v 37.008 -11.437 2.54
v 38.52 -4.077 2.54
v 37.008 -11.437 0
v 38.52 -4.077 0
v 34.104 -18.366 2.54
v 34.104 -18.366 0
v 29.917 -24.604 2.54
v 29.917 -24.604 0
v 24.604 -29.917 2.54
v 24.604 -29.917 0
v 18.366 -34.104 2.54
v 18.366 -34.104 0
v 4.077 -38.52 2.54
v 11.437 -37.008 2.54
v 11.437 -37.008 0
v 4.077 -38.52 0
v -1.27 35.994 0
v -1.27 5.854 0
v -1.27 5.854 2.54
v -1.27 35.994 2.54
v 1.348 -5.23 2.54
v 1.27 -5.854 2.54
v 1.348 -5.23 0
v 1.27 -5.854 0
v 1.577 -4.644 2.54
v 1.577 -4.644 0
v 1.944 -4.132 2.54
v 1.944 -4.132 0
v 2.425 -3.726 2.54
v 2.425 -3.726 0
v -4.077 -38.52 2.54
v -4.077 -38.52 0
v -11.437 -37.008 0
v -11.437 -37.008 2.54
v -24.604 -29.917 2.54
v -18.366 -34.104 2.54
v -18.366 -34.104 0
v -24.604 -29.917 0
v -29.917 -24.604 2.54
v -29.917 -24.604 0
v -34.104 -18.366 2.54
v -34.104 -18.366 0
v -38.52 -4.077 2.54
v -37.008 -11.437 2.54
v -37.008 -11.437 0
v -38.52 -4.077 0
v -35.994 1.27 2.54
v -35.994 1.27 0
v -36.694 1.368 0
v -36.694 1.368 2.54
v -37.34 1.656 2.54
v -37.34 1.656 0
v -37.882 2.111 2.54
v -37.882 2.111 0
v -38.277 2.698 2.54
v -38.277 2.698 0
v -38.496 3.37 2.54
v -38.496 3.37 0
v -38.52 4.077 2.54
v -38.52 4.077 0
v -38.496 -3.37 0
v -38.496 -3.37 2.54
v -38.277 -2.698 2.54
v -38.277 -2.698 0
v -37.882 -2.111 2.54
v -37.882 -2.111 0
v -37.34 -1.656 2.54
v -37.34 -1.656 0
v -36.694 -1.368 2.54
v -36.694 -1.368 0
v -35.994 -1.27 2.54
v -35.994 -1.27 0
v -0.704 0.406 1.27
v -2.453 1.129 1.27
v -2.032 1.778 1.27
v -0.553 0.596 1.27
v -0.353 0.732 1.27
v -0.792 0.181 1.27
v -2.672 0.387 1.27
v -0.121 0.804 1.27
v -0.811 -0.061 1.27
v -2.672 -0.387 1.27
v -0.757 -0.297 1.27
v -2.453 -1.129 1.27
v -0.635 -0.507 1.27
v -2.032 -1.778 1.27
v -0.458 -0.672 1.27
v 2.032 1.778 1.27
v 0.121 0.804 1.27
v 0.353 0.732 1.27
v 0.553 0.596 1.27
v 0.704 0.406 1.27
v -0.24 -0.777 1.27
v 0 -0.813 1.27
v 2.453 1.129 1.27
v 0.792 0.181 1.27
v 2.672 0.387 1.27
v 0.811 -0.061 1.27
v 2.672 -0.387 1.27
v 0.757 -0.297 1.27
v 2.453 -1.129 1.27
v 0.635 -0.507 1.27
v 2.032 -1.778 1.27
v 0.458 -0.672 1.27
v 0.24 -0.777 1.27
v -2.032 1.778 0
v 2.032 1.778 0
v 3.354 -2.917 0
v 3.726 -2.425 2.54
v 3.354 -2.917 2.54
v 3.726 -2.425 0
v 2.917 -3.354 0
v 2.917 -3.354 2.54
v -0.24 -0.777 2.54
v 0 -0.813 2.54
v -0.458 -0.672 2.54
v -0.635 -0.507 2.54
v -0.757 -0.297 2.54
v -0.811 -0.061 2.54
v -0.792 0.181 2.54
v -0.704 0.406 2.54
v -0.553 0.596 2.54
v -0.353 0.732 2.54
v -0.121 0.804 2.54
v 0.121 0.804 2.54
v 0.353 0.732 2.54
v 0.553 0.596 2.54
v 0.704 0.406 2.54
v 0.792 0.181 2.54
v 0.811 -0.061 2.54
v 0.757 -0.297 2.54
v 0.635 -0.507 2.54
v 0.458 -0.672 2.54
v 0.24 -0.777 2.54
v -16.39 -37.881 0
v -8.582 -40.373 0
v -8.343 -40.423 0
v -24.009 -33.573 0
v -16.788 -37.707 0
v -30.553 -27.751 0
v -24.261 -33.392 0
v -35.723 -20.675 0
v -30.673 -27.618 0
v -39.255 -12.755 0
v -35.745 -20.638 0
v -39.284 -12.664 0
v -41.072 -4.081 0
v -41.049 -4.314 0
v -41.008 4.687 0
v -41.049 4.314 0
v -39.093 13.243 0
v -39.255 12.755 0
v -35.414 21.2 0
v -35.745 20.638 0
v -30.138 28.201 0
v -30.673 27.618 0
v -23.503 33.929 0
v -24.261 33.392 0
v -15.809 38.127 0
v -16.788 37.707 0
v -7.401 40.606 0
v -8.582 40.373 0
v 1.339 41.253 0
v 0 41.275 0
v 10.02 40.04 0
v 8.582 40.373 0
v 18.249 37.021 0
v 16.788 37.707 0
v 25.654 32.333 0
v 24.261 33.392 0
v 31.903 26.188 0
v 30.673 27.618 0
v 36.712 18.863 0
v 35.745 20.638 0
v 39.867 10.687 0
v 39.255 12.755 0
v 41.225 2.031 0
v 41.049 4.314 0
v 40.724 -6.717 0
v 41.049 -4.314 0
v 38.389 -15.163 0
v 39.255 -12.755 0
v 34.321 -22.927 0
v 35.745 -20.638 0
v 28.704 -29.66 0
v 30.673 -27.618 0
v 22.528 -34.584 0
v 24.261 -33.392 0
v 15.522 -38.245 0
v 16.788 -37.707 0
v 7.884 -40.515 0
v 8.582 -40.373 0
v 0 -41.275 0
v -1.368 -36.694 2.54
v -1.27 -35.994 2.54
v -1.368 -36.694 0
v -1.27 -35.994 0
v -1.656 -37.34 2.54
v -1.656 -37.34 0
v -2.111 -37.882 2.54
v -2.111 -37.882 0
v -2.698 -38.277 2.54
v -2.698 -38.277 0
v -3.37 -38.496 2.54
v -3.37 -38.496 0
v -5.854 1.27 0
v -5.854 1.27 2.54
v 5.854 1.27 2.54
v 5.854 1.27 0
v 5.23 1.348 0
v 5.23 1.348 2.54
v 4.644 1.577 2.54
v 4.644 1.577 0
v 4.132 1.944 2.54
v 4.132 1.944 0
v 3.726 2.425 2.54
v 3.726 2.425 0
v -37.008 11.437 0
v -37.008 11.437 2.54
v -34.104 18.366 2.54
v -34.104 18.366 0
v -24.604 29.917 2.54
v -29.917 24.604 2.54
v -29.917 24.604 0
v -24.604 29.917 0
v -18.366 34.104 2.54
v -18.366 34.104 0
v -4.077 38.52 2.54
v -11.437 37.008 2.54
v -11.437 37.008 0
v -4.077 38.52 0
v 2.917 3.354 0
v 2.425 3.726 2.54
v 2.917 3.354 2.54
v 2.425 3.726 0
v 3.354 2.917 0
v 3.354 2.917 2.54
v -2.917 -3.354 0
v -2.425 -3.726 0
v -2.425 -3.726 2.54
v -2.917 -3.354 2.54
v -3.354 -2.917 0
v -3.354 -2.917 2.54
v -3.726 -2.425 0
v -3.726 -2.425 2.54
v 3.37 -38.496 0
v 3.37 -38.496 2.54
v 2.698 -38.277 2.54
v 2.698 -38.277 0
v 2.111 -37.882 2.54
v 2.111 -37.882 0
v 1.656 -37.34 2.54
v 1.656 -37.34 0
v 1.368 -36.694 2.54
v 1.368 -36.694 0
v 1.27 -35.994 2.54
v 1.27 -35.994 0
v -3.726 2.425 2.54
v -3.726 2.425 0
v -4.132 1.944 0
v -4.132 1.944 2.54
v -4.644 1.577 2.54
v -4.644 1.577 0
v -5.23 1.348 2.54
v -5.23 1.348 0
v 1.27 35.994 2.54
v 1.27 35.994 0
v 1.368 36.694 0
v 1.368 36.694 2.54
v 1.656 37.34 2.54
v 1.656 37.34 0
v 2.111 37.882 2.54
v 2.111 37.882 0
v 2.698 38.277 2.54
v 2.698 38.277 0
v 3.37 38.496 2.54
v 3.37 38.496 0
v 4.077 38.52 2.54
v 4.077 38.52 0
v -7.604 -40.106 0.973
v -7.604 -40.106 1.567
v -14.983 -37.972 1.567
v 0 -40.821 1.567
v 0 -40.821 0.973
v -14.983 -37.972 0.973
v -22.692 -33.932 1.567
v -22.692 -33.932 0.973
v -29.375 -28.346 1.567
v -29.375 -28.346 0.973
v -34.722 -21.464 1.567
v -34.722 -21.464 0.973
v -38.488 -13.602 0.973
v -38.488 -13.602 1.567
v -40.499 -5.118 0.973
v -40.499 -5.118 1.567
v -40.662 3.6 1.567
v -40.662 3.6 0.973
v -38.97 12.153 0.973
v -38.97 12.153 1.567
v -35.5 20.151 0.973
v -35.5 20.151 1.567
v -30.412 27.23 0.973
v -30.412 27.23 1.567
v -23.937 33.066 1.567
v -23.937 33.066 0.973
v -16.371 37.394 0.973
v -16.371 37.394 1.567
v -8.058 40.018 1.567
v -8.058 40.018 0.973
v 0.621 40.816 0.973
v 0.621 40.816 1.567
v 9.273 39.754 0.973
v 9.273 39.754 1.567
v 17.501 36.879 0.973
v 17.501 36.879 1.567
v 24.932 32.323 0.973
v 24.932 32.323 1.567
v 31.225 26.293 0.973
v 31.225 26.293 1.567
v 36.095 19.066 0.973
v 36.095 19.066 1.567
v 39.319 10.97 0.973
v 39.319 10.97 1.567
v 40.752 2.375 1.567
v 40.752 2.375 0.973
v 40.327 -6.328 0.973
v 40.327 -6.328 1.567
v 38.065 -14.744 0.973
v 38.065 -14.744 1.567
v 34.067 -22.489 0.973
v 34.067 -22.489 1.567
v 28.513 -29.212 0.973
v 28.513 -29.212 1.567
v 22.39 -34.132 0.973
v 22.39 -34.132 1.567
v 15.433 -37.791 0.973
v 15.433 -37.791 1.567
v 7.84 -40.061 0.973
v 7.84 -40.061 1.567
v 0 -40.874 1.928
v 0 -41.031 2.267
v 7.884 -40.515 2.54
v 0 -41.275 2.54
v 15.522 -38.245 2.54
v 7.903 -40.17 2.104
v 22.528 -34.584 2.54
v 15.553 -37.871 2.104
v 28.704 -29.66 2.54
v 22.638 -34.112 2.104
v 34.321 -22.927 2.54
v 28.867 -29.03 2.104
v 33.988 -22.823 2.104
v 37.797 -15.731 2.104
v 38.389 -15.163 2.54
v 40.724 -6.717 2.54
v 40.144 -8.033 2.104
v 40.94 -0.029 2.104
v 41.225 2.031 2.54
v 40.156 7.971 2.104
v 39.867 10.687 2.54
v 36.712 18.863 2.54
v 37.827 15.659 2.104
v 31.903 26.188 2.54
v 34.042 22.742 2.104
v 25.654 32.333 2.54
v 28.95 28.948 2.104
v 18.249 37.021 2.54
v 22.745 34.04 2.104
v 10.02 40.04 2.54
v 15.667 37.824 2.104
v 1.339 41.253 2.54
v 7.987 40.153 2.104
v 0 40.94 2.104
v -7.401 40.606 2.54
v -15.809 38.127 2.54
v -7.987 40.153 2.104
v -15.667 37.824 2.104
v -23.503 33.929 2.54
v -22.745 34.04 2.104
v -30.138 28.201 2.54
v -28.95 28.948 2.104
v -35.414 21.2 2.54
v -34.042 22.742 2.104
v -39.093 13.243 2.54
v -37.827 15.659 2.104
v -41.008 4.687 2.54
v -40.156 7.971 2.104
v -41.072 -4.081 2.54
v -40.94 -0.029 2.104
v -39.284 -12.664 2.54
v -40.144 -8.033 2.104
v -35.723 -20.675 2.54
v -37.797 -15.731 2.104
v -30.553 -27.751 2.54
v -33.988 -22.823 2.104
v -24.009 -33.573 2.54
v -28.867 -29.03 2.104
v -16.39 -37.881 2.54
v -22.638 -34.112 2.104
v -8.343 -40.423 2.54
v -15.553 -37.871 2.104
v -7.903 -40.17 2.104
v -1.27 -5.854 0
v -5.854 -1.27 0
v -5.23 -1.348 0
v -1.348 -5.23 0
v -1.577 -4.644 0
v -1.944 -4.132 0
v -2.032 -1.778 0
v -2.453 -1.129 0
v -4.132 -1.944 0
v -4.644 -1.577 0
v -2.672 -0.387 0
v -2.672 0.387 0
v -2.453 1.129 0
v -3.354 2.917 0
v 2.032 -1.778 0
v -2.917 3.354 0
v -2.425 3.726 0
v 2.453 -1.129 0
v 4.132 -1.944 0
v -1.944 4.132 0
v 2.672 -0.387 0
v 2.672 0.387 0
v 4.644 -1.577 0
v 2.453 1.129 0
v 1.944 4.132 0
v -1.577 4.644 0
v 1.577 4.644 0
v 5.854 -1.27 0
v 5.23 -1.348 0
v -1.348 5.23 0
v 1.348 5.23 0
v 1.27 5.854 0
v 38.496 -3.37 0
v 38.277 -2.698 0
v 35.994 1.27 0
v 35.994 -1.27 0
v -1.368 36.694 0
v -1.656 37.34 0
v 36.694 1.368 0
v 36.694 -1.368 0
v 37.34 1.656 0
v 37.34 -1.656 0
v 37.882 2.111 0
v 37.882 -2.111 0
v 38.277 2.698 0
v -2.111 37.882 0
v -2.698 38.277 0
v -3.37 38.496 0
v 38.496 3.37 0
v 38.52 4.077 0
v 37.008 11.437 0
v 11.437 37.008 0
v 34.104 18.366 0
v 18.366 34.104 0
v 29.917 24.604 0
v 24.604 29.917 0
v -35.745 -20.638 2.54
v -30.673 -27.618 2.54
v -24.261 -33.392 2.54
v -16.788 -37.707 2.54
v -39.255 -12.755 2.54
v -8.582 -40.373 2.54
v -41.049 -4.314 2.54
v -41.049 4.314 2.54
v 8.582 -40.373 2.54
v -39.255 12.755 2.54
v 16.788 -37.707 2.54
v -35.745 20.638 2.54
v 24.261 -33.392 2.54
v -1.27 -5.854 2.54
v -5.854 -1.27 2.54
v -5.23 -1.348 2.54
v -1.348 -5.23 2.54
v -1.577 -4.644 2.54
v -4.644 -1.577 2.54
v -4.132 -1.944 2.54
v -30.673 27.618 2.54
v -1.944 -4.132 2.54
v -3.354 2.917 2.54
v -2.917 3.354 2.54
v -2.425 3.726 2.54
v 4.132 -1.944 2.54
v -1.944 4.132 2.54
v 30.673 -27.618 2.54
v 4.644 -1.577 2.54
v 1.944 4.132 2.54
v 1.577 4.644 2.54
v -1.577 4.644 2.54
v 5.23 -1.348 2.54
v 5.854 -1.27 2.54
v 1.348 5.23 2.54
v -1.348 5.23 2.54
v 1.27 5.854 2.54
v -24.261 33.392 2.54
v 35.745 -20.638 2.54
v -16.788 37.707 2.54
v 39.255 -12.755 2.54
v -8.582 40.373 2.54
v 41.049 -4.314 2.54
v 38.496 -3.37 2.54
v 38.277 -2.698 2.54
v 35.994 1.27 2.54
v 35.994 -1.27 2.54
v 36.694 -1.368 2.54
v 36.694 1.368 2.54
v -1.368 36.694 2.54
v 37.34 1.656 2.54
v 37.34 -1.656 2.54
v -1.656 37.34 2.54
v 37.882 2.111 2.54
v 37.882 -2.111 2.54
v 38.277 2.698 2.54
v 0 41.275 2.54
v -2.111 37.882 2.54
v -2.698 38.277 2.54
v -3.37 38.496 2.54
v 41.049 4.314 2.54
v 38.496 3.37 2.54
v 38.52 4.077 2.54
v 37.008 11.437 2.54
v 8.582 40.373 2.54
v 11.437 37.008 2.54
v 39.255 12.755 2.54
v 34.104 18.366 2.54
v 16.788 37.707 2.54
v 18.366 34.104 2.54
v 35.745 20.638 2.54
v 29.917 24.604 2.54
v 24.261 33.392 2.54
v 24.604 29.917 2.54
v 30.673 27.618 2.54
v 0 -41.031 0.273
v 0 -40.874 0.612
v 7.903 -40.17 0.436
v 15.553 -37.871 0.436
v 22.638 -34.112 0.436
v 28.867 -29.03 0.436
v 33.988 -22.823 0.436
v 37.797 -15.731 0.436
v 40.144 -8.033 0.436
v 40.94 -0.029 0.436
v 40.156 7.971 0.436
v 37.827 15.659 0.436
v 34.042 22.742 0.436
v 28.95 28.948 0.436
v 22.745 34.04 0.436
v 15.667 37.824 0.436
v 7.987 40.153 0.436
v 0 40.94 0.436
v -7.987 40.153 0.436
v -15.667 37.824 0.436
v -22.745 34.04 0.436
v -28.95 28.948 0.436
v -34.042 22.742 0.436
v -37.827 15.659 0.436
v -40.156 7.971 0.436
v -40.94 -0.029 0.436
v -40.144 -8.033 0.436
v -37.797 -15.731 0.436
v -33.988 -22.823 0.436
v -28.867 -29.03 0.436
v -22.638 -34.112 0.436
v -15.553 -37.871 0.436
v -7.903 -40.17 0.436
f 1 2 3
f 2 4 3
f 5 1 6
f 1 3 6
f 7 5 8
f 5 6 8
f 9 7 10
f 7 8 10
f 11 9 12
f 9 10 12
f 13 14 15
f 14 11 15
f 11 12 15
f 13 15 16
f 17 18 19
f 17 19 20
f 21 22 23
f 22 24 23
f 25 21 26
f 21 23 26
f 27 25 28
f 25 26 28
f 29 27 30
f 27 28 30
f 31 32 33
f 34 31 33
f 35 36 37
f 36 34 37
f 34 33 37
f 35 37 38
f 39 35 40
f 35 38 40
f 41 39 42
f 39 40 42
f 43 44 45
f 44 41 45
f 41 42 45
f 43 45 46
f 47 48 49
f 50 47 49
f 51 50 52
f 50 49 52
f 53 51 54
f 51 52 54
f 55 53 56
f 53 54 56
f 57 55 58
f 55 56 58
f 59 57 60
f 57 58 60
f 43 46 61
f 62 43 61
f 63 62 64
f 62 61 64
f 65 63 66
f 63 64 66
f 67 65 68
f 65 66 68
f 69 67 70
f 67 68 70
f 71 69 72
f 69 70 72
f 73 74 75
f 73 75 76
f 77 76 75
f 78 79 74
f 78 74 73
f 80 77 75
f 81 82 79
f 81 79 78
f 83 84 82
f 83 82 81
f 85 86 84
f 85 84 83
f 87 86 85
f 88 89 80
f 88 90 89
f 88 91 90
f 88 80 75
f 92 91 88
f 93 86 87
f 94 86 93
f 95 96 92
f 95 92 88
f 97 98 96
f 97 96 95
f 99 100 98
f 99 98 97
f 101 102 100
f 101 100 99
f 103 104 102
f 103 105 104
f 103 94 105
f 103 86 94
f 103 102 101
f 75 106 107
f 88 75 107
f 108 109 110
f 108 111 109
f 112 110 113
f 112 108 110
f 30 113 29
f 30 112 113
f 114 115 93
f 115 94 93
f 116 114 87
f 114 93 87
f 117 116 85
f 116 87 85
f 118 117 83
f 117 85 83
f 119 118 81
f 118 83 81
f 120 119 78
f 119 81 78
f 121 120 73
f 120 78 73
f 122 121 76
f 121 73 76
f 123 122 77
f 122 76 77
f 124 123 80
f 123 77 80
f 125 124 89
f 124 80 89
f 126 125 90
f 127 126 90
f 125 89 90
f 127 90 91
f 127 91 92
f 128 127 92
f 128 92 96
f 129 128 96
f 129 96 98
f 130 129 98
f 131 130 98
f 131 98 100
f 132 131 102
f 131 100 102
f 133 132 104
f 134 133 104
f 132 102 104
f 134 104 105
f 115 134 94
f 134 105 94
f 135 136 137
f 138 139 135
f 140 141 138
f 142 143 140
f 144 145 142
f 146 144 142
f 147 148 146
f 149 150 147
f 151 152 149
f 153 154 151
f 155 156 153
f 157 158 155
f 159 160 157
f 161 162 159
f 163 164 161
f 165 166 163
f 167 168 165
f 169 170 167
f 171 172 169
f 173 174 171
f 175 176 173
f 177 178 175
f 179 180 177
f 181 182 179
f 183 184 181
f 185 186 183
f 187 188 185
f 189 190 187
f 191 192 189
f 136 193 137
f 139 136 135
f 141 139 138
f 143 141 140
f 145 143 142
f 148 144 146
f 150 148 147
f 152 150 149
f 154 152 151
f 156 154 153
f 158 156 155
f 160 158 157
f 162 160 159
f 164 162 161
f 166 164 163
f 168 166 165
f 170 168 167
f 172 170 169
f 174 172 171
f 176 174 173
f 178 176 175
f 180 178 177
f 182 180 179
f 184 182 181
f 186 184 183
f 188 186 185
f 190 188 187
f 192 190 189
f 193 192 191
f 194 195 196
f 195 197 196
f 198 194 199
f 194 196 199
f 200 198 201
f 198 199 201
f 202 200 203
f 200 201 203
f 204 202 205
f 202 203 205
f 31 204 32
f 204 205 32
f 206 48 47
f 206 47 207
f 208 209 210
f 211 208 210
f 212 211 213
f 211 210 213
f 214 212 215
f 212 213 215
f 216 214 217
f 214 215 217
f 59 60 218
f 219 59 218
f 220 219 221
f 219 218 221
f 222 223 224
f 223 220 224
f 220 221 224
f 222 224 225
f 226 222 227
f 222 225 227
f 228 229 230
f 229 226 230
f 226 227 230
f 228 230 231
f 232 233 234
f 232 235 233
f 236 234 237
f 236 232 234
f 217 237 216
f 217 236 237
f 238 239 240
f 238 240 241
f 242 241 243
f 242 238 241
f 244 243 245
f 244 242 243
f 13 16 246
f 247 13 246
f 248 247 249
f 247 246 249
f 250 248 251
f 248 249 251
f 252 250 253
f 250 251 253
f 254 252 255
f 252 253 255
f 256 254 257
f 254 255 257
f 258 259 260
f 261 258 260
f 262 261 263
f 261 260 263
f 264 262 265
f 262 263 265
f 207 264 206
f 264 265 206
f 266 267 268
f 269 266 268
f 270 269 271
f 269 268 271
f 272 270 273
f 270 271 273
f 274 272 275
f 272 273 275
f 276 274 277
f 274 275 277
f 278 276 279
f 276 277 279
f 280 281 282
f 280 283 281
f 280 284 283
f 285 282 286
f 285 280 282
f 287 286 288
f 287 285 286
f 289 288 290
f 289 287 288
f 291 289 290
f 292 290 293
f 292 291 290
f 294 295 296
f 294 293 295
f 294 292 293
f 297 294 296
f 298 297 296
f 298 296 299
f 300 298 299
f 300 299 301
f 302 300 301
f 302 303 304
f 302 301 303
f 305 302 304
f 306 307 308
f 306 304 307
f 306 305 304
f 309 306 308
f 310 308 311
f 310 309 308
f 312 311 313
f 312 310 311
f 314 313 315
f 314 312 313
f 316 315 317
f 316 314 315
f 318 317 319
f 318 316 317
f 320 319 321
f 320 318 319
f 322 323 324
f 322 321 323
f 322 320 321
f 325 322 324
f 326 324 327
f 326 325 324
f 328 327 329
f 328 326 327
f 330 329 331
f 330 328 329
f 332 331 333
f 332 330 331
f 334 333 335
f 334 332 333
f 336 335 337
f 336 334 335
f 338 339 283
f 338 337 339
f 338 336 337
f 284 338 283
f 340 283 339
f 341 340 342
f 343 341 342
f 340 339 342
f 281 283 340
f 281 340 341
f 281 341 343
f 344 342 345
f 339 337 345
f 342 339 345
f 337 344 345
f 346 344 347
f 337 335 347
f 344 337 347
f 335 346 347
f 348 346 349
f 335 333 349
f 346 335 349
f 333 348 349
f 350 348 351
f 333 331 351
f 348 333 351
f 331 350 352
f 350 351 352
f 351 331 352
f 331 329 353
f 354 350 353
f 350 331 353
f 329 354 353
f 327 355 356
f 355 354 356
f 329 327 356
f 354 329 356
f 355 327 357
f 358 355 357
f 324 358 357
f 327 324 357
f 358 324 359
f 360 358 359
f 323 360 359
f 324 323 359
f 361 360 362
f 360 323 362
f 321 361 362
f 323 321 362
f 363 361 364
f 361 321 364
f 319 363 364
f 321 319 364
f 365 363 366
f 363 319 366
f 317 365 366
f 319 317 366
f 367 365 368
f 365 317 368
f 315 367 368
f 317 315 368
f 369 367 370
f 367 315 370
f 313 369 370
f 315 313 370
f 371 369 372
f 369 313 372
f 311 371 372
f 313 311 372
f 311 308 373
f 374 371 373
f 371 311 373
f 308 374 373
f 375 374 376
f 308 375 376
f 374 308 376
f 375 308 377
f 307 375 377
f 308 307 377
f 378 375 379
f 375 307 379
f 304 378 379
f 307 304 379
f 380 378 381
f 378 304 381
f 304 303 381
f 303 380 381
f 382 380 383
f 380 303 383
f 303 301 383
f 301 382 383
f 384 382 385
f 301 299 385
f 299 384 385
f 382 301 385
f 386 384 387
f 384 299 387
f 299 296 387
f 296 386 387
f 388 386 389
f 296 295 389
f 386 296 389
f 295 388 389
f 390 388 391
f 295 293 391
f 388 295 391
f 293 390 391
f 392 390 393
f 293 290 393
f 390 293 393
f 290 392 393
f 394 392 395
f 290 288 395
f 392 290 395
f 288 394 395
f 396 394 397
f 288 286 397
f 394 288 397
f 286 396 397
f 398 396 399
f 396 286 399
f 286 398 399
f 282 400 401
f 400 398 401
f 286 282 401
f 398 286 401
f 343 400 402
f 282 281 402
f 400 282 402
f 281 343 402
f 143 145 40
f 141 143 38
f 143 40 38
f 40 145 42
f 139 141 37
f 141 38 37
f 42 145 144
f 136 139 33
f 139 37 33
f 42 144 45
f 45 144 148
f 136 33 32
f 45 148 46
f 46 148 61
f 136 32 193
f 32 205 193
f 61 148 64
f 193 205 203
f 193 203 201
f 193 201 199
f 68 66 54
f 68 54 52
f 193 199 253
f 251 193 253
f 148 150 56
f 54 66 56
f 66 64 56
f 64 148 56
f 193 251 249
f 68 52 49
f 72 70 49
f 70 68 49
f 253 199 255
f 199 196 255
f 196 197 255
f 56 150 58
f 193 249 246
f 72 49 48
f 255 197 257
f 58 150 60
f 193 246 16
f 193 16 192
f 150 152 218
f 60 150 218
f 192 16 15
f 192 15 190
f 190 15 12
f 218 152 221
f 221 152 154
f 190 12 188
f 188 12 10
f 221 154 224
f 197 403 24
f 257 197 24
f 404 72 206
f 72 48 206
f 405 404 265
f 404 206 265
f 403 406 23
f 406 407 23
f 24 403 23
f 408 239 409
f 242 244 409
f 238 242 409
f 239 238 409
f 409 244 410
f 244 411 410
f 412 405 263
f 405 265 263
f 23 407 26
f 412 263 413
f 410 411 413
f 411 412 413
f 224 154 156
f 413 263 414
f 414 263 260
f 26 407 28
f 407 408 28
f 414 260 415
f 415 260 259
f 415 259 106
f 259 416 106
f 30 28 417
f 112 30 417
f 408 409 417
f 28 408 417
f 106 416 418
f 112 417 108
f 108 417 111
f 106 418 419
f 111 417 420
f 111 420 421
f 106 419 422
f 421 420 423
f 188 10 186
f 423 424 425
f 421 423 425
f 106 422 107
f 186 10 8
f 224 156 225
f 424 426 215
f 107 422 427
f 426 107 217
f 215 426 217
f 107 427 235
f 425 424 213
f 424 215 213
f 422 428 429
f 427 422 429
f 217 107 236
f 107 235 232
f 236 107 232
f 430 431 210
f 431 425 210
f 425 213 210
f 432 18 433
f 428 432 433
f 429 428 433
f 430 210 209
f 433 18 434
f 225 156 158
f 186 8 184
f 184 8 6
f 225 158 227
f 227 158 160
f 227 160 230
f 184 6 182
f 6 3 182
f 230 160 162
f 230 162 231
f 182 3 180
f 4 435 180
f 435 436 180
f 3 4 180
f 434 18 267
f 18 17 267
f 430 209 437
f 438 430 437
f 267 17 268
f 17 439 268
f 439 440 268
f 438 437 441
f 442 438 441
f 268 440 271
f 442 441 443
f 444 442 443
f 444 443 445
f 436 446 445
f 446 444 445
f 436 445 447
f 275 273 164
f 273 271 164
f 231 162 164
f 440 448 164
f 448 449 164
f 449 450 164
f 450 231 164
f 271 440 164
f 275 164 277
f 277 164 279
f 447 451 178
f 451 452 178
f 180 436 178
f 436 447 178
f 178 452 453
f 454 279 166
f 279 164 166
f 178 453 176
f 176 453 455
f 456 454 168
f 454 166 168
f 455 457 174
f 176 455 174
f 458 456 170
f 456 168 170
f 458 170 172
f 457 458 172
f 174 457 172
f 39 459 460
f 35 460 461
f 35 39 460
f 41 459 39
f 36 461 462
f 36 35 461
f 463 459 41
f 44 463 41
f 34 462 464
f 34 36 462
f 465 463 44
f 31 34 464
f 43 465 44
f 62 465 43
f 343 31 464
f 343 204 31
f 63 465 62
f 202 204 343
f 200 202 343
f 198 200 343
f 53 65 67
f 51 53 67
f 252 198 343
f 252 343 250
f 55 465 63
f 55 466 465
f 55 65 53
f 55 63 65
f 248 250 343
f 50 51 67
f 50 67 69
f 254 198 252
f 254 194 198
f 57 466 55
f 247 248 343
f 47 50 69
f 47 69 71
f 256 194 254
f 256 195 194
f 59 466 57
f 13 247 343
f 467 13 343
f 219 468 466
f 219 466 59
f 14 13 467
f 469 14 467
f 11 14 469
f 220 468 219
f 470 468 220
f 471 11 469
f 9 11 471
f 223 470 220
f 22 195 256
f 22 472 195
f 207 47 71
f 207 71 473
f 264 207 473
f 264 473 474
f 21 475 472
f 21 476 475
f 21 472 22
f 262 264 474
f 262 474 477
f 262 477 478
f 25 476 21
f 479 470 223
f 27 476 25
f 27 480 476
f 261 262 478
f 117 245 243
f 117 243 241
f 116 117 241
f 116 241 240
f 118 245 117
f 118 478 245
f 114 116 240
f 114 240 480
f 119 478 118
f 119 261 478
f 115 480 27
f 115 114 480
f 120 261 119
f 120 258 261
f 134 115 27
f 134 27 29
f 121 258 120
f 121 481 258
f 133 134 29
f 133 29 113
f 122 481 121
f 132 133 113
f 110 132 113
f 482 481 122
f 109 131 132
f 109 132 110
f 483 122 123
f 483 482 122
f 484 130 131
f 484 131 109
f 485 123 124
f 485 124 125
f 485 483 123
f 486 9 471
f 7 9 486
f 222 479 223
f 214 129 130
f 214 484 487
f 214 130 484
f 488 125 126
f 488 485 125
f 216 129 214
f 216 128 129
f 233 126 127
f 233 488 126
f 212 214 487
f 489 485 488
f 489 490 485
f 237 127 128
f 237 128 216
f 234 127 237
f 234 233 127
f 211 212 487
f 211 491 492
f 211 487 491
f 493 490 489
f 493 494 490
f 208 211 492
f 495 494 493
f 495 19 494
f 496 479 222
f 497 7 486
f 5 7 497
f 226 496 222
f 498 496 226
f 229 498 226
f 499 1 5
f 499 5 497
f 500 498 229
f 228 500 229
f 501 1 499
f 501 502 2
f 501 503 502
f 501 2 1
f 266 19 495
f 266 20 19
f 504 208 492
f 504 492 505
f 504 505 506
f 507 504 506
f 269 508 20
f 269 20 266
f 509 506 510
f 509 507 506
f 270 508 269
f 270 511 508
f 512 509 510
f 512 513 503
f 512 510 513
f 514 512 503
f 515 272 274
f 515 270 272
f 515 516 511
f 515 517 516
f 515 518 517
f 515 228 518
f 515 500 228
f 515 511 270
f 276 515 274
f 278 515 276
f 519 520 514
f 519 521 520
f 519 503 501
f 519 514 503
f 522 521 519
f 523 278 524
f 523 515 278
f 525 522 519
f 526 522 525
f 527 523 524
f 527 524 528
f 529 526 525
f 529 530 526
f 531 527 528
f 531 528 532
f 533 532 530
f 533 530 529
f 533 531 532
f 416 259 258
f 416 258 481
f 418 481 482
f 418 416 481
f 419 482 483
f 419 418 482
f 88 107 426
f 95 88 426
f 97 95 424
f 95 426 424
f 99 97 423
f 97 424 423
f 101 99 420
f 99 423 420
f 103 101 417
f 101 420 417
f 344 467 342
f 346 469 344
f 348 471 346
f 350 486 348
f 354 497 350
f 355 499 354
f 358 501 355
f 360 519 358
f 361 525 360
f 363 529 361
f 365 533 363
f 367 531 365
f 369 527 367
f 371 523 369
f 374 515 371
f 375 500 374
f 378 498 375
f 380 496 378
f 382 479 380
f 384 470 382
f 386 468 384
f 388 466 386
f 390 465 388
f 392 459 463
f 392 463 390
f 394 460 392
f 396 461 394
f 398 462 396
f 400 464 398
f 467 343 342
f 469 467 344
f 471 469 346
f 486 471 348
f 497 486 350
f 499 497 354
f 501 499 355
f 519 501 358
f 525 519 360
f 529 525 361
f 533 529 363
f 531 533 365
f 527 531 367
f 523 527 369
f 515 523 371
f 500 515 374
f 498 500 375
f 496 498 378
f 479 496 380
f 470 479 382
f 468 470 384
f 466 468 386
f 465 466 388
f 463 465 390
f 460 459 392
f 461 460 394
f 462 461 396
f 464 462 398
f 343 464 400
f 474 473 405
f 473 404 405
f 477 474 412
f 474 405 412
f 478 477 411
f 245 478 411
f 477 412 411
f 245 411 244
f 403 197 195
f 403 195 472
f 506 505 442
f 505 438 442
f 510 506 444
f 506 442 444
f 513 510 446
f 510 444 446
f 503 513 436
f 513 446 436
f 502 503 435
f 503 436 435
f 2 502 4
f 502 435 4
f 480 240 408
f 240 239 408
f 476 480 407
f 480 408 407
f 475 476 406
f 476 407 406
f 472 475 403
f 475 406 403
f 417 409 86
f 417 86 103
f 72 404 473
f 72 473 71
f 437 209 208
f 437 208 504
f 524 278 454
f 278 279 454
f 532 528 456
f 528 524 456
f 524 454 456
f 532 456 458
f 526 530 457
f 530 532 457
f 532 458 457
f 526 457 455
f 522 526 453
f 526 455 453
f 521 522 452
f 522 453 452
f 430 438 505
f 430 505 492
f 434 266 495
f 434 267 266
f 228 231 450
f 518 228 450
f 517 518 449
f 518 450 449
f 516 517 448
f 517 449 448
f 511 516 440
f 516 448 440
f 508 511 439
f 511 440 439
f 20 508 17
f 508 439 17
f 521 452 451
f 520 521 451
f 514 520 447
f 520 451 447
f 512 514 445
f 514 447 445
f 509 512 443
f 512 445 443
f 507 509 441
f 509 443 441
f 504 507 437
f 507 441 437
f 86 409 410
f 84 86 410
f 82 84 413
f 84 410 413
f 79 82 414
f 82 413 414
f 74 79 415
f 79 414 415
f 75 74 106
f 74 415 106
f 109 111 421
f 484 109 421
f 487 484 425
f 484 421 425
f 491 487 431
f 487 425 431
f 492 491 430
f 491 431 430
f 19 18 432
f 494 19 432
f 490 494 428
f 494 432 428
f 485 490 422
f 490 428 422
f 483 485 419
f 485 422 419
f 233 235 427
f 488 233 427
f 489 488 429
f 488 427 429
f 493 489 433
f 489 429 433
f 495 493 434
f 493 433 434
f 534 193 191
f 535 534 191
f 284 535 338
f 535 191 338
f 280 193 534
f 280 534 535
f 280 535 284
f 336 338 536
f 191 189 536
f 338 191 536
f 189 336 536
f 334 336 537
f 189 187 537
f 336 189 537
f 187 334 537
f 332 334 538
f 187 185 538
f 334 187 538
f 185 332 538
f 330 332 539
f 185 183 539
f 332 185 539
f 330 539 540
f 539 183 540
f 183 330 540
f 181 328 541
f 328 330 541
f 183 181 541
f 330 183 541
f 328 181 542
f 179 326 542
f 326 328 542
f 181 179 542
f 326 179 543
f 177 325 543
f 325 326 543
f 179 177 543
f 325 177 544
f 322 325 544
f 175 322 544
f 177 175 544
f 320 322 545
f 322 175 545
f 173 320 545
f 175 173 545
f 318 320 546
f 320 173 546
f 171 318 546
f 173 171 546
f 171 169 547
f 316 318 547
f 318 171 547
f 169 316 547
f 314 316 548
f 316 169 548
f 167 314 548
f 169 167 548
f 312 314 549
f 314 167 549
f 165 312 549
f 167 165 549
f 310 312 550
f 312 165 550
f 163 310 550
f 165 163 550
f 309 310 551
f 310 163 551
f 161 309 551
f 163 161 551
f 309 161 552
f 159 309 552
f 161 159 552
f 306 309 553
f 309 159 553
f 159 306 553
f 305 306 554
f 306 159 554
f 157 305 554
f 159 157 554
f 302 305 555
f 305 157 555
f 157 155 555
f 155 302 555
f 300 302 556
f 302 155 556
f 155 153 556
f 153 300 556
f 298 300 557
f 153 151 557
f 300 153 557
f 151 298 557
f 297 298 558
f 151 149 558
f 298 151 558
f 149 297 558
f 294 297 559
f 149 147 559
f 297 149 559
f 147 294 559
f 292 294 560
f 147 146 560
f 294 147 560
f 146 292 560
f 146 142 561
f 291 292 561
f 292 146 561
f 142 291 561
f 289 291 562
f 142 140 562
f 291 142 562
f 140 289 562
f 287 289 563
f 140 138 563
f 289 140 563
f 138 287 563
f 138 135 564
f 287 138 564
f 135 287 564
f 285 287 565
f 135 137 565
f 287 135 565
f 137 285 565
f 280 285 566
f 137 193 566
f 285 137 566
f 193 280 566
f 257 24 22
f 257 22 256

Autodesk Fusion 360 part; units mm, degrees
sketch "Sketch1" plane through (0, 0, 0) normal (0, 0, 1) x (1, 0, 0)
  circle A0 centre (0, 0) radius 41.275
  circle A1 centre (0, 0) radius 38.735
  circle A2 centre (0, 0) radius 4.445
  dimension "d1" = 82.55
  dimension "d2" = 77.47
  dimension "d5" = 8.89
extrude "Extrude1" add sketch "Sketch1" along normal blind 2.54 makes body 1 at (41.2237, -2.0574, 1.6933) makes body 2 at (4.4229, -0.4426, 0.8467)
sketch "Sketch4" plane through (0, 0, 0) normal (0, 0, 1) x (1, 0, 0)
  line L0 (-1.27, 39.37) -> (1.27, 39.37)
  line L1 (1.27, 39.37) -> (1.27, 1.27)
  line L2 (1.27, 1.27) -> (-1.27, 1.27)
  line L3 (-1.27, 1.27) -> (-1.27, 39.37)
  dimension "d12" = 2.54
  dimension "d13" = 1.27
  dimension "d14" = 38.1
  dimension "d15" = 1.27
extrude "Extrude3" add sketch "Sketch4" along normal blind 2.54 separate body makes body 3
pattern_circular "C-Pattern1" count 4 over 360 about axis through (0, 0, 1.75) along (0, 0, 1) of bodies 3 makes body 4 at (-26.67, 1.27, 0.8467) makes body 5 at (-1.27, -26.67, 0.8467) makes body 6 at (26.67, -1.27, 0.8467)
combine "Combine1" operation add target body 3 tool bodies 1 2 6 5 4
fillet "Fillet1" radius 2.54 8 edges at (4.2597, 1.27, 1.27) (1.27, 4.2597, 1.27) (-1.27, 4.2597, 1.27) (-4.2597, 1.27, 1.27) (-4.2597, -1.27, 1.27) (-1.27, -4.2597, 1.27) (1.27, -4.2597, 1.27) (4.2597, -1.27, 1.27) on bodies 3
fillet "Fillet2" radius 2.54 8 edges at (1.27, -38.7142, 1.27) (-1.27, -38.7142, 1.27) (-38.7142, -1.27, 1.27) (-38.7142, 1.27, 1.27) (-1.27, 38.7142, 1.27) (1.27, 38.7142, 1.27) (38.7142, 1.27, 1.27) (38.7142, -1.27, 1.27) on bodies 3
sketch "Sketch5" plane through (0, 0, 0) normal (1, 0, 0) x (0, 1, 0)
  line L0 (-41.275, 2.54) -> (-40.8209, 2.159)
  line L1 (-40.8209, 2.159) -> (-40.8209, 0.381)
  line L2 (-40.8209, 0.381) -> (-41.275, 0)
  line L3 (-41.275, 2.54) -> (-41.275, 0)
  dimension "d24" = 1.778
  dimension "d25" = 2.54
  dimension "d26" = 130
  dimension "d27" = 130
  dimension "d28" = 41.275
revolve "Revolve1" cut sketch "Sketch5" angle 360 about axis through (0, 0, 1.75) along (0, 0, 1) bodies 3
hole "Hole1" at (0, 0, 2.54) direction (0, 0, -1) diameter 1.6256 depth 6.35 tip angle 118 bodies 3
sketch "Sketch6" plane through (0, 0, 2.54) normal (0, 0, 1) x (-1, 0, 0)
  circle A0 centre (0, 0) radius 0.8115
  arc A1 (4.0774, -38.5198) -> (38.5198, -4.0774) centre (0, 0) ccw
  arc A2 (1.27, -35.9939) -> (4.0774, -38.5198) centre (3.81, -35.9939) ccw
  line L0 (1.27, -35.9939) -> (1.27, -5.8544)
  arc A3 (2.4245, -3.7255) -> (1.27, -5.8544) centre (3.81, -5.8544) ccw
  arc A4 (2.4245, -3.7255) -> (3.7255, -2.4245) centre (0, 0) ccw
  arc A5 (5.8544, -1.27) -> (3.7255, -2.4245) centre (5.8544, -3.81) ccw
  line L1 (5.8544, -1.27) -> (35.9939, -1.27)
  arc A6 (38.5198, -4.0774) -> (35.9939, -1.27) centre (35.9939, -3.81) ccw
  line L2 (-35.9939, -1.27) -> (-5.8544, -1.27)
  arc A7 (-3.7255, -2.4245) -> (-5.8544, -1.27) centre (-5.8544, -3.81) ccw
  arc A8 (-3.7255, -2.4245) -> (-2.4245, -3.7255) centre (0, 0) ccw
  arc A9 (-1.27, -5.8544) -> (-2.4245, -3.7255) centre (-3.81, -5.8544) ccw
  line L3 (-1.27, -5.8544) -> (-1.27, -35.9939)
  arc A10 (-4.0774, -38.5198) -> (-1.27, -35.9939) centre (-3.81, -35.9939) ccw
  arc A11 (-38.5198, -4.0774) -> (-4.0774, -38.5198) centre (0, 0) ccw
  arc A12 (-35.9939, -1.27) -> (-38.5198, -4.0774) centre (-35.9939, -3.81) ccw
  circle A13 centre (0, 0) radius 41.275
  line L4 (-1.27, 35.9939) -> (-1.27, 5.8544)
  arc A14 (-2.4245, 3.7255) -> (-1.27, 5.8544) centre (-3.81, 5.8544) ccw
  arc A15 (-2.4245, 3.7255) -> (-3.7255, 2.4245) centre (0, 0) ccw
  arc A16 (-5.8544, 1.27) -> (-3.7255, 2.4245) centre (-5.8544, 3.81) ccw
  line L5 (-5.8544, 1.27) -> (-35.9939, 1.27)
  arc A17 (-38.5198, 4.0774) -> (-35.9939, 1.27) centre (-35.9939, 3.81) ccw
  arc A18 (-4.0774, 38.5198) -> (-38.5198, 4.0774) centre (0, 0) ccw
  arc A19 (-1.27, 35.9939) -> (-4.0774, 38.5198) centre (-3.81, 35.9939) ccw
  line L6 (35.9939, 1.27) -> (5.8544, 1.27)
  arc A20 (3.7255, 2.4245) -> (5.8544, 1.27) centre (5.8544, 3.81) ccw
  arc A21 (3.7255, 2.4245) -> (2.4245, 3.7255) centre (0, 0) ccw
  arc A22 (1.27, 5.8544) -> (2.4245, 3.7255) centre (3.81, 5.8544) ccw
  line L7 (1.27, 5.8544) -> (1.27, 35.9939)
  arc A23 (4.0774, 38.5198) -> (1.27, 35.9939) centre (3.81, 35.9939) ccw
  arc A24 (38.5198, 4.0774) -> (4.0774, 38.5198) centre (0, 0) ccw
  arc A25 (35.9939, 1.27) -> (38.5198, 4.0774) centre (35.9939, 3.81) ccw
fillet "Fillet3" radius 1.27 2 edges at (-38.0585, -14.7615, 2.159) (-38.0585, -14.7615, 0.381) on bodies 3
sketch "Sketch8" plane through (0, 0, 0) normal (0, 0, -1) x (1, 0, 0)
  circle A0 centre (0, 0) radius 0.8115
  arc A1 (-1.27, 35.9939) -> (-4.0774, 38.5198) centre (-3.81, 35.9939) ccw
  line L0 (-1.27, 35.9939) -> (-1.27, 5.8544)
  arc A2 (-2.4245, 3.7255) -> (-1.27, 5.8544) centre (-3.81, 5.8544) ccw
  arc A3 (-2.4245, 3.7255) -> (-3.7255, 2.4245) centre (0, 0) ccw
  arc A4 (-5.8544, 1.27) -> (-3.7255, 2.4245) centre (-5.8544, 3.81) ccw
  line L1 (-5.8544, 1.27) -> (-35.9939, 1.27)
  arc A5 (-38.5198, 4.0774) -> (-35.9939, 1.27) centre (-35.9939, 3.81) ccw
  arc A6 (-4.0774, 38.5198) -> (-38.5198, 4.0774) centre (0, 0) ccw
  line L2 (-35.9939, -1.27) -> (-5.8544, -1.27)
  arc A7 (-3.7255, -2.4245) -> (-5.8544, -1.27) centre (-5.8544, -3.81) ccw
  arc A8 (-3.7255, -2.4245) -> (-2.4245, -3.7255) centre (0, 0) ccw
  arc A9 (-1.27, -5.8544) -> (-2.4245, -3.7255) centre (-3.81, -5.8544) ccw
  line L3 (-1.27, -5.8544) -> (-1.27, -35.9939)
  arc A10 (-4.0774, -38.5198) -> (-1.27, -35.9939) centre (-3.81, -35.9939) ccw
  arc A11 (-38.5198, -4.0774) -> (-4.0774, -38.5198) centre (0, 0) ccw
  arc A12 (-35.9939, -1.27) -> (-38.5198, -4.0774) centre (-35.9939, -3.81) ccw
  arc A13 (35.9939, 1.27) -> (38.5198, 4.0774) centre (35.9939, 3.81) ccw
  line L4 (35.9939, 1.27) -> (5.8544, 1.27)
  arc A14 (3.7255, 2.4245) -> (5.8544, 1.27) centre (5.8544, 3.81) ccw
  arc A15 (3.7255, 2.4245) -> (2.4245, 3.7255) centre (0, 0) ccw
  arc A16 (1.27, 5.8544) -> (2.4245, 3.7255) centre (3.81, 5.8544) ccw
  line L5 (1.27, 5.8544) -> (1.27, 35.9939)
  arc A17 (4.0774, 38.5198) -> (1.27, 35.9939) centre (3.81, 35.9939) ccw
  arc A18 (38.5198, 4.0774) -> (4.0774, 38.5198) centre (0, 0) ccw
  line L6 (1.27, -35.9939) -> (1.27, -5.8544)
  arc A19 (2.4245, -3.7255) -> (1.27, -5.8544) centre (3.81, -5.8544) ccw
  arc A20 (2.4245, -3.7255) -> (3.7255, -2.4245) centre (0, 0) ccw
  arc A21 (5.8544, -1.27) -> (3.7255, -2.4245) centre (5.8544, -3.81) ccw
  line L7 (5.8544, -1.27) -> (35.9939, -1.27)
  arc A22 (38.5198, -4.0774) -> (35.9939, -1.27) centre (35.9939, -3.81) ccw
  arc A23 (4.0774, -38.5198) -> (38.5198, -4.0774) centre (0, 0) ccw
  arc A24 (1.27, -35.9939) -> (4.0774, -38.5198) centre (3.81, -35.9939) ccw
  circle A25 centre (0, 0) radius 41.275
  line L8 (-2.0319, 1.778) -> (2.0319, 1.778)
  line L9 (-2.0319, -1.778) -> (2.0319, -1.778)
  arc A26 (-2.0319, 1.778) -> (-2.0319, -1.778) centre (0, 0) ccw
  arc A27 (2.0319, -1.778) -> (2.0319, 1.778) centre (0, 0) ccw
  dimension "d42" = 5.4
  dimension "d43" = 3.556
extrude "Extrude4" cut sketch "Sketch8" against normal blind 1.27 contours L8 L9 A26 A27 bodies 3
